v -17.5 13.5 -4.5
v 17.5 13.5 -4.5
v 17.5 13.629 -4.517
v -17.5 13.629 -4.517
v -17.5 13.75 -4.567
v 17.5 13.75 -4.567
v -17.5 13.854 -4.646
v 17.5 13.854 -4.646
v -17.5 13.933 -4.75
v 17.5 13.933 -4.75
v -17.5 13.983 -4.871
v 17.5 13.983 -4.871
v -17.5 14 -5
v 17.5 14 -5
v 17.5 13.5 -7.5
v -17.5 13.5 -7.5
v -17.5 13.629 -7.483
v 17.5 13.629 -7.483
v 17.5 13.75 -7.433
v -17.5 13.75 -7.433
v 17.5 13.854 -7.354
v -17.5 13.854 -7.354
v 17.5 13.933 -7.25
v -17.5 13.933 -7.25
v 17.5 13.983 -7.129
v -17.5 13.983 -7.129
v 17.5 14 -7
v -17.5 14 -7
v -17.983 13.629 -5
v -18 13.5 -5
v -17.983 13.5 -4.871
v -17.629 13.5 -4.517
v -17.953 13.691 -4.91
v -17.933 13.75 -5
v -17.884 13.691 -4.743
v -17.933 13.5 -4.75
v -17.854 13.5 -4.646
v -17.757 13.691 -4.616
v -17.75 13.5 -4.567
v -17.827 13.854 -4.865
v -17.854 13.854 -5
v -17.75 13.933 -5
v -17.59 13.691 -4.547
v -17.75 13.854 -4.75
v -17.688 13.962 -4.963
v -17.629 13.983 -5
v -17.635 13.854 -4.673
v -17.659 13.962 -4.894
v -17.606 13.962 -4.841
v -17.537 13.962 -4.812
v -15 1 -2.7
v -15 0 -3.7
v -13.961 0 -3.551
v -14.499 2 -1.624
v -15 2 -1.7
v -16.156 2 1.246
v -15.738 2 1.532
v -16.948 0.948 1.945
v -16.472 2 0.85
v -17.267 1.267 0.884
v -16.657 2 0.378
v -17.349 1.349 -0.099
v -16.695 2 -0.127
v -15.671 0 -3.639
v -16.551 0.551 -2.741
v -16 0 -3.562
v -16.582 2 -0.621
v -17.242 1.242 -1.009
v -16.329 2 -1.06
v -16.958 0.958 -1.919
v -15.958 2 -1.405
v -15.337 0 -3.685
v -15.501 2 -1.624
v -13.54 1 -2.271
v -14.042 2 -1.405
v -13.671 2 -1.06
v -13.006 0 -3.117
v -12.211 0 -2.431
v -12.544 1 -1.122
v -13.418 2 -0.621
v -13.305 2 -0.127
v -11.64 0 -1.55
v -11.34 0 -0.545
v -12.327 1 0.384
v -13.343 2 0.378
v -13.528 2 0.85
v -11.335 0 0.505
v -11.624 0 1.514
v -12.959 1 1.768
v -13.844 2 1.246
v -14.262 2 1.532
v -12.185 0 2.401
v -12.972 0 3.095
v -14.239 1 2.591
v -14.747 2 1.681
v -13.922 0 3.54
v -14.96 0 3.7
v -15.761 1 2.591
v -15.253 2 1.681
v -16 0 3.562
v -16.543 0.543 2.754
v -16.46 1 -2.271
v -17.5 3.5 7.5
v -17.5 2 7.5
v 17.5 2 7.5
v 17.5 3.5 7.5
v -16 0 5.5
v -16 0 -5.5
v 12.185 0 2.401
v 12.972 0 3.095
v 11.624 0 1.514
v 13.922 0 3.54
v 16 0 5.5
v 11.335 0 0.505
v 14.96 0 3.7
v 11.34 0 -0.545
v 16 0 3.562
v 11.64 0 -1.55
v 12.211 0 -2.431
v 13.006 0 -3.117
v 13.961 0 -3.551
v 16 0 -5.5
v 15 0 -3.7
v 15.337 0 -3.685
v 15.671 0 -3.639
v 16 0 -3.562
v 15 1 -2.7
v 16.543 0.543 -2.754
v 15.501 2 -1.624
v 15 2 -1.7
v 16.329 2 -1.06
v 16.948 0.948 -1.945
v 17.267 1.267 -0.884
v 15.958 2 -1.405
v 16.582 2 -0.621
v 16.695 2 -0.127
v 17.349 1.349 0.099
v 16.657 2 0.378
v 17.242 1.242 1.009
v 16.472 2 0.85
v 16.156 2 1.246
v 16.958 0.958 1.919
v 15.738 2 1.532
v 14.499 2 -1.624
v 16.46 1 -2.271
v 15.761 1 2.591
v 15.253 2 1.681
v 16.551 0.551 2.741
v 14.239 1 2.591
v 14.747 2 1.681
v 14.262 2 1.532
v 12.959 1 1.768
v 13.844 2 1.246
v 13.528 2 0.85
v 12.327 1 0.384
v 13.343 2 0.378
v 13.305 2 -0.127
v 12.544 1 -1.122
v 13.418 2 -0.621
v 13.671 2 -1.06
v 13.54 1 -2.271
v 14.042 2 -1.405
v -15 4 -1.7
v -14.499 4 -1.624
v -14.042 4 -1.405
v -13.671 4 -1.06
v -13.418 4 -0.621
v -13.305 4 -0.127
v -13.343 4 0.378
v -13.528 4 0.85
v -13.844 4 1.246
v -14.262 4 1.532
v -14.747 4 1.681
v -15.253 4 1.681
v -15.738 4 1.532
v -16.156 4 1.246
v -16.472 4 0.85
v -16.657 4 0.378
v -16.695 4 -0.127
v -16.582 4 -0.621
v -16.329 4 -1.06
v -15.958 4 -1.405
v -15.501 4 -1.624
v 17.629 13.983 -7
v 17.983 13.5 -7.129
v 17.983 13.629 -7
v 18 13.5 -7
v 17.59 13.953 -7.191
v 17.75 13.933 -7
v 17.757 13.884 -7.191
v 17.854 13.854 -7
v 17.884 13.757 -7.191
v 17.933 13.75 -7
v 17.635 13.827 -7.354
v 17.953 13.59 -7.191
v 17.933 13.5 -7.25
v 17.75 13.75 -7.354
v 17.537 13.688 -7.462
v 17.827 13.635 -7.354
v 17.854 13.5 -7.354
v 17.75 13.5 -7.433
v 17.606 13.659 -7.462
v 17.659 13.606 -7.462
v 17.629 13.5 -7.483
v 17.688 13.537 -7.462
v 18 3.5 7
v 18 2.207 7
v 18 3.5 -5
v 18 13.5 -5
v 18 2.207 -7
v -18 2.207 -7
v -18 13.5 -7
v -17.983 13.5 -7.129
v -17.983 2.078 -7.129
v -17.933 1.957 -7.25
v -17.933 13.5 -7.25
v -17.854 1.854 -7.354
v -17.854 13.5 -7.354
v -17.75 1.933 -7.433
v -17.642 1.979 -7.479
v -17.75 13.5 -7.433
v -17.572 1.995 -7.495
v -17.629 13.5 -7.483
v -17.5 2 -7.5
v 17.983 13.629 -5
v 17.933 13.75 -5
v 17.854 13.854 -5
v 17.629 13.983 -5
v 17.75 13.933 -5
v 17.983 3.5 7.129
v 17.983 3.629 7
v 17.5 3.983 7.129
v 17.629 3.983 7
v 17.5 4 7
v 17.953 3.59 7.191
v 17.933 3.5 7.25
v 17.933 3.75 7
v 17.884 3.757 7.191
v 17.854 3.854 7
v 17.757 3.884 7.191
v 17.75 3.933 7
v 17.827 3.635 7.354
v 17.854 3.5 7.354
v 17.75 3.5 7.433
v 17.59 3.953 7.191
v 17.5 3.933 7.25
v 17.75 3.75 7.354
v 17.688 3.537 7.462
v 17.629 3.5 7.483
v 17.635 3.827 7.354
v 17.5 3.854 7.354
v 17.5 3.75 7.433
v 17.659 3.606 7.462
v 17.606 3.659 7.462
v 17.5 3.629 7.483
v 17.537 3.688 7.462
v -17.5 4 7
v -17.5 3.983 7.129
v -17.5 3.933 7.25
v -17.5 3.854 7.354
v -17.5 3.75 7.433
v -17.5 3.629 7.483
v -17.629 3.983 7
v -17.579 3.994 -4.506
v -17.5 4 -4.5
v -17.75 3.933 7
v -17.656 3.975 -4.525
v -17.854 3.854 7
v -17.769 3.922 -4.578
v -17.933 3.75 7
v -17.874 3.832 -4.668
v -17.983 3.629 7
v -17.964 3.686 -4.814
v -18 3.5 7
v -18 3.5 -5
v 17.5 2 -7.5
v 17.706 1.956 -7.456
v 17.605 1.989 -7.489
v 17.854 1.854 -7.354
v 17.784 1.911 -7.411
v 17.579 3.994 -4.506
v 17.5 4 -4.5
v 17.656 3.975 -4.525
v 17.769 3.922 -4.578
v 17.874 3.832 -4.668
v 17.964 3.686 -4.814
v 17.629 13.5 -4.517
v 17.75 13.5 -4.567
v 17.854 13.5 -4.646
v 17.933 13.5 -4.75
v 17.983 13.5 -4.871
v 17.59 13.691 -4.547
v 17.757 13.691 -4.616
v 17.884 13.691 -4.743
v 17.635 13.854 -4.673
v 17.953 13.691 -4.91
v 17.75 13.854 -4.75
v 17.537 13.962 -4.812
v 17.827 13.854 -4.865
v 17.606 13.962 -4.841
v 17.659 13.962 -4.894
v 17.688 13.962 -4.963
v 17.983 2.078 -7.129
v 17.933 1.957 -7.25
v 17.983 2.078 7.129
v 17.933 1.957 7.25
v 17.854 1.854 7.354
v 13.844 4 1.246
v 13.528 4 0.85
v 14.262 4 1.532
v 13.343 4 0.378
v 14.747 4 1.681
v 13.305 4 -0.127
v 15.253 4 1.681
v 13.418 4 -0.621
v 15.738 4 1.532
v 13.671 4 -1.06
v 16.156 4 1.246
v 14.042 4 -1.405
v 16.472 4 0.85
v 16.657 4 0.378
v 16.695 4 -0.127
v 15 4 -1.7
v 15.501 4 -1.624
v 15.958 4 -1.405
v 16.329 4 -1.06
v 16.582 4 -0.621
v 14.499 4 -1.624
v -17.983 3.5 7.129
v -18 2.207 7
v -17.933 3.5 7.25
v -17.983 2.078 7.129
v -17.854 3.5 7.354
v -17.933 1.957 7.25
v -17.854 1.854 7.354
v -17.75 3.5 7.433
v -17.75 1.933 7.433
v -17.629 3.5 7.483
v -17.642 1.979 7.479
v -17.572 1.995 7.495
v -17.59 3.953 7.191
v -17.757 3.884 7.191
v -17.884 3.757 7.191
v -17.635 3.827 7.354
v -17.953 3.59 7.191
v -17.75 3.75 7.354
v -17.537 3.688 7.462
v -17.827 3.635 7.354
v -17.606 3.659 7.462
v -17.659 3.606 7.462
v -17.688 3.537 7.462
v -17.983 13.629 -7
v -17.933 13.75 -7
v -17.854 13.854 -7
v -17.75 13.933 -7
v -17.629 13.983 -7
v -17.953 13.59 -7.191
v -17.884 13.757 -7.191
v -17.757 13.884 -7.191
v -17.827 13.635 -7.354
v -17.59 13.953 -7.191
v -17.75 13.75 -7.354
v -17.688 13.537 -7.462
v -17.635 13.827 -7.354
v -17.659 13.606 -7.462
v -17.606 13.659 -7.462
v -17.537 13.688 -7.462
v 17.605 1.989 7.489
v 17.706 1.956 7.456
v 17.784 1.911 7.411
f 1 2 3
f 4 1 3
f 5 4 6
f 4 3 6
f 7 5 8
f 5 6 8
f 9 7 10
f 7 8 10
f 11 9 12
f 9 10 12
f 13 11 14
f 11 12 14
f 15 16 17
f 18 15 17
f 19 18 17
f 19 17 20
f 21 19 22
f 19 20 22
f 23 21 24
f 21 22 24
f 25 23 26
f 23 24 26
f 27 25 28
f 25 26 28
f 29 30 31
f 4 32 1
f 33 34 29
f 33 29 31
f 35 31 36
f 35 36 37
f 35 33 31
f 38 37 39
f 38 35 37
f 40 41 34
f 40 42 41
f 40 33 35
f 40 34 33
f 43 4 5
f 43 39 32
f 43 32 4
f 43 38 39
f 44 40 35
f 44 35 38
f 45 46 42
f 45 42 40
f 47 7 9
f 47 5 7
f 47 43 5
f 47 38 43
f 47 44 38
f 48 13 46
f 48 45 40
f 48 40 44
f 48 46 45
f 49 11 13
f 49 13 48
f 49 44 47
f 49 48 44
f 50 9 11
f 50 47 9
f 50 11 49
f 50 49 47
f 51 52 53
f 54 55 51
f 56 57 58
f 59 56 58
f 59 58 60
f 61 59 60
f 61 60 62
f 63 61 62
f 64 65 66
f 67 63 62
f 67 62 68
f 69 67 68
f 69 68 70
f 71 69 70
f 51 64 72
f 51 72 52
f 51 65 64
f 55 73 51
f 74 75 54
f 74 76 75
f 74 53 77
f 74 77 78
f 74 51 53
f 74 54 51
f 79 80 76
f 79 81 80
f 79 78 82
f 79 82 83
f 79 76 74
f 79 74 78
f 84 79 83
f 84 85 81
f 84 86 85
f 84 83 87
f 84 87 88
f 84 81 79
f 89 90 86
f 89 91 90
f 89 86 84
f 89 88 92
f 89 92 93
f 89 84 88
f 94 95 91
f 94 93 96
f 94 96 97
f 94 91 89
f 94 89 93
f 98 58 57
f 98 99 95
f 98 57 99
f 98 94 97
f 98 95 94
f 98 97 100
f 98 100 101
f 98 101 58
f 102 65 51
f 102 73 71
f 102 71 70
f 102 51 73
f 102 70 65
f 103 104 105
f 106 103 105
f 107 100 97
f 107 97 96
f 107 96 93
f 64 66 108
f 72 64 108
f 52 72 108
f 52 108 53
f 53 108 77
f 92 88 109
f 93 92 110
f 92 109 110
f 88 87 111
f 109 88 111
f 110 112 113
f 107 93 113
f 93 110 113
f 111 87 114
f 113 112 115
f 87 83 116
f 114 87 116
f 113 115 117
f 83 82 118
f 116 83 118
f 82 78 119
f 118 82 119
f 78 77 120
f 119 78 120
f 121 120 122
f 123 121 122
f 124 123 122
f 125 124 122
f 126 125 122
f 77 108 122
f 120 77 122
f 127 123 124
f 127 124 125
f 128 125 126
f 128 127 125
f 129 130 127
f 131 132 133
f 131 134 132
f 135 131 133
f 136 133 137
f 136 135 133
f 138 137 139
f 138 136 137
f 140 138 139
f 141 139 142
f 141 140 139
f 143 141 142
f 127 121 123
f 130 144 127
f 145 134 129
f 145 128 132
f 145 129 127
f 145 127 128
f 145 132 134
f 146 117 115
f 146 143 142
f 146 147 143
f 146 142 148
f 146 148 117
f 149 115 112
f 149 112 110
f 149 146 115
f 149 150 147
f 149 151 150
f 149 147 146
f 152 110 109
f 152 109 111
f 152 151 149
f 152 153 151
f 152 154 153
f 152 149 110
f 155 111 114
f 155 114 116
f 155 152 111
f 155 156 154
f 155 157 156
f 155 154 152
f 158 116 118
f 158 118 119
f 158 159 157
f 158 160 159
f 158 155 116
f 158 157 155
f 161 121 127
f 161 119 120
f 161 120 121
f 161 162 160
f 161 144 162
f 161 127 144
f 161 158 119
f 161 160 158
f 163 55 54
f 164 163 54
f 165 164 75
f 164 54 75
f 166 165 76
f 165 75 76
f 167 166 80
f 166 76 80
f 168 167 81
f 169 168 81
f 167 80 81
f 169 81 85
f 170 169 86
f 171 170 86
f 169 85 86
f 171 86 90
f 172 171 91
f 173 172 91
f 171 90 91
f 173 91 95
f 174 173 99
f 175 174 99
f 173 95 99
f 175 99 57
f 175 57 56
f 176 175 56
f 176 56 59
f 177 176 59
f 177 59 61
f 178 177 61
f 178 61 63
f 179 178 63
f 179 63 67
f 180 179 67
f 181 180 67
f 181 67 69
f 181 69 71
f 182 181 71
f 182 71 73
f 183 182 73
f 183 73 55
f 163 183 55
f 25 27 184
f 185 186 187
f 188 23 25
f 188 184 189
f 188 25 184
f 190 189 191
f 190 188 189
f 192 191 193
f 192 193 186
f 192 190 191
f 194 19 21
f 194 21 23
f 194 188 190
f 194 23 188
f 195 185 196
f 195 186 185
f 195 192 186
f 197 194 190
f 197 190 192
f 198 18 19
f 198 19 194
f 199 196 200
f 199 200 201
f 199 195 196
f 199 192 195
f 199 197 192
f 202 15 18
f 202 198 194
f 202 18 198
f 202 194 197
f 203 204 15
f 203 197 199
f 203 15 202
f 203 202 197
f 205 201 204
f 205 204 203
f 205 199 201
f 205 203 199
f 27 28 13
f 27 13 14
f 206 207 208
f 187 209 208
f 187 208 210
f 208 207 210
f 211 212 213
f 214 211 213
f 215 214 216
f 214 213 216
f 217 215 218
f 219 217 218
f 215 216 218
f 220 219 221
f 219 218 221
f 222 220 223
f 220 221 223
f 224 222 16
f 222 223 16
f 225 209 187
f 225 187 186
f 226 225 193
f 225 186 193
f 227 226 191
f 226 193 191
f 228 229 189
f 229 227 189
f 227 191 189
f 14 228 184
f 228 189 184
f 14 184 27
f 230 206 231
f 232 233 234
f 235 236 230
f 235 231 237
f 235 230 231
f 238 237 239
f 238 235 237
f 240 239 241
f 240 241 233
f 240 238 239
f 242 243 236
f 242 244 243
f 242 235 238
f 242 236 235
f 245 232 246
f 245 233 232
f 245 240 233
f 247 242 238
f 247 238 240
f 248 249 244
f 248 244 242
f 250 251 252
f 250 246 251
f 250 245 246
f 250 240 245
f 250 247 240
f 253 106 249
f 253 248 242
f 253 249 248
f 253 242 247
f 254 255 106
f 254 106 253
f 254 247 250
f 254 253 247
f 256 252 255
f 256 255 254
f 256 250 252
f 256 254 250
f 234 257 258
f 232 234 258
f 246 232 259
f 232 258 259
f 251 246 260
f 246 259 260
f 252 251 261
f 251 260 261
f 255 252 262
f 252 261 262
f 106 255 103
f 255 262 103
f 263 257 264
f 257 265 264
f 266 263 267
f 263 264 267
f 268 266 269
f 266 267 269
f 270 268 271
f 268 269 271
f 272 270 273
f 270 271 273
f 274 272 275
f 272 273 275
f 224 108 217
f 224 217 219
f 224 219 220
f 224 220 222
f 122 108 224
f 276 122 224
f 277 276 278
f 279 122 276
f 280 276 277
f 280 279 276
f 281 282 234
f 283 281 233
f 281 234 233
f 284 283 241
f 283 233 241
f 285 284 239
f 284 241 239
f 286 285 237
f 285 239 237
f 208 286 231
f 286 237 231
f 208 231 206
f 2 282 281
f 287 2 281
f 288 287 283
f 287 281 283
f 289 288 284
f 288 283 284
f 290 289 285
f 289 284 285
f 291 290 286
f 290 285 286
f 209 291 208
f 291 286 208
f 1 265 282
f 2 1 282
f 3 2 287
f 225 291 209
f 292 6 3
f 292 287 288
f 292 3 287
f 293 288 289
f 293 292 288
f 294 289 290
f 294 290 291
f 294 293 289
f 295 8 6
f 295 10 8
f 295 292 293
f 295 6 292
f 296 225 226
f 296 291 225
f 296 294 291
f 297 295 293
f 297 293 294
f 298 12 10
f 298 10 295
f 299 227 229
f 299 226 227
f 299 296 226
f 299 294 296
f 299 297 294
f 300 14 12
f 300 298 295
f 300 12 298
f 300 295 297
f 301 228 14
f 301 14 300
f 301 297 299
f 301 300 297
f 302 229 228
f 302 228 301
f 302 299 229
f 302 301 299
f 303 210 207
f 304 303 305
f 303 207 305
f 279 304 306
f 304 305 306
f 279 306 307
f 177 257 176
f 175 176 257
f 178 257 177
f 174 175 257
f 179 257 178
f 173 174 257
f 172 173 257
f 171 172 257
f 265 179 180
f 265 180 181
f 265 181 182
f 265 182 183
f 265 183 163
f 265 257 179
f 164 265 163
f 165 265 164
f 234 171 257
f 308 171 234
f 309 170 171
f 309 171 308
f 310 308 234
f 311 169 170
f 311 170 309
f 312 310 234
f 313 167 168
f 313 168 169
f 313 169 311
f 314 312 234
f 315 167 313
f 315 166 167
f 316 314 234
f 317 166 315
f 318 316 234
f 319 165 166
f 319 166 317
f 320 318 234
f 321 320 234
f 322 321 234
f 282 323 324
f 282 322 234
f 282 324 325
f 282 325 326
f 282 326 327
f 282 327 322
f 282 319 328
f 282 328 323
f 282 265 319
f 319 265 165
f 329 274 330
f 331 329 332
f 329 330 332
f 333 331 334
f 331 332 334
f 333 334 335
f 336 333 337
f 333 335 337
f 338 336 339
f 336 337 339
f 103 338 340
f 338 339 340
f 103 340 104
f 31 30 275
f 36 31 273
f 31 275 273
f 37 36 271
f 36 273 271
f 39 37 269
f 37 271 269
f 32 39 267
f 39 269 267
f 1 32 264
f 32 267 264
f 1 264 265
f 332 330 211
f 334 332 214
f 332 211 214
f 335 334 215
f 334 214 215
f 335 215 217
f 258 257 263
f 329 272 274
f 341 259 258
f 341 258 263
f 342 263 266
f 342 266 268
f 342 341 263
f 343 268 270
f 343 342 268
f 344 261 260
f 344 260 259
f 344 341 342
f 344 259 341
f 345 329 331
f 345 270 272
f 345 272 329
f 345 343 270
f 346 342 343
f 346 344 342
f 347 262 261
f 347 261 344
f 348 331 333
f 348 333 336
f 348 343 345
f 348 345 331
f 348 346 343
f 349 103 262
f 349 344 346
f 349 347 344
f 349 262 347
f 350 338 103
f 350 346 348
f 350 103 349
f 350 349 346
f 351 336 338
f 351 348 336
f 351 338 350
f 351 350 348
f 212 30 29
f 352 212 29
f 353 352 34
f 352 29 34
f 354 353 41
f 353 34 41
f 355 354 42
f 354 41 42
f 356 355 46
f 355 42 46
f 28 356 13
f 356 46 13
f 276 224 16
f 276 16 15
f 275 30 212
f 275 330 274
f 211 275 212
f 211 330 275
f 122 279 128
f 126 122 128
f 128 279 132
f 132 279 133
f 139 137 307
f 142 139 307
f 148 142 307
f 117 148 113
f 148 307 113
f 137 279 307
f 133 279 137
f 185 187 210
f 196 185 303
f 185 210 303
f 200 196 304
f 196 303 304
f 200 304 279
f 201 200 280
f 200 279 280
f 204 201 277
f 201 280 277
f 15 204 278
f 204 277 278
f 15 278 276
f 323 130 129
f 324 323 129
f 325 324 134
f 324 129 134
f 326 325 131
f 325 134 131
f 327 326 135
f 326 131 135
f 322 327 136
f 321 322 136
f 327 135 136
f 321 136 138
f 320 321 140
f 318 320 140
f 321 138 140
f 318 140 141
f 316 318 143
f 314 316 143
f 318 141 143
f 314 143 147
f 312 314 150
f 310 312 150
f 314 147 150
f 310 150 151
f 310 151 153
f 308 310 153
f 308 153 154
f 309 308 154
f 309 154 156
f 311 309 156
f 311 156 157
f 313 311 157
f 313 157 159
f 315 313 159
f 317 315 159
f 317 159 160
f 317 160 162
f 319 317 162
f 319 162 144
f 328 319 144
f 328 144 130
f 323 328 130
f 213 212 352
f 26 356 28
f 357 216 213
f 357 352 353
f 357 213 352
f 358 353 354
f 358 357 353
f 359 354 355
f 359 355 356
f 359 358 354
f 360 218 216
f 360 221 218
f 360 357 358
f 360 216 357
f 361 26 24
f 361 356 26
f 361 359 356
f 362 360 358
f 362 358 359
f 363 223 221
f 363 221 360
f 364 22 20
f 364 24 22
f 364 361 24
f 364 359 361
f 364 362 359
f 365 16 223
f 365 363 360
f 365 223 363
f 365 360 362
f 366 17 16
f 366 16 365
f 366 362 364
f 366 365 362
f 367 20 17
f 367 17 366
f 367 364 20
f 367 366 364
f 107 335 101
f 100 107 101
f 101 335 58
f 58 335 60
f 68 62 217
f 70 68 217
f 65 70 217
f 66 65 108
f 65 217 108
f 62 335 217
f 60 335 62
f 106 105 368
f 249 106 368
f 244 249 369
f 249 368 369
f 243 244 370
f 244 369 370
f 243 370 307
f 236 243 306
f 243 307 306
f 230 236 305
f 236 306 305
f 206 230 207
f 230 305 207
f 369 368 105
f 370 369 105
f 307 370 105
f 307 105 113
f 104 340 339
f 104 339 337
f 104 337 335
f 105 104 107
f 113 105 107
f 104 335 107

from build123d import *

# Parameters (mm, degrees)
SKETCH_1_W          = 36
SKETCH_1_H          = 15
EXTRUDE_1_DEPTH     = 4
SKETCH_2_W          = 36
SKETCH_2_H          = 3
EXTRUDE_2_DEPTH     = 10
SKETCH_3_R          = 1.7
CUT_EXTRUDE_1_DEPTH = 8
CHAMFER_1_SIZE      = 2
FILLET_1_R          = 0.5
FILLET_2_R          = 0.5


with BuildPart() as part:
    # Эскиз1 → Бобышка-Вытянуть1 (new body)
    with BuildSketch(Plane(origin=(0, 0, 0), x_dir=(1, 0, 0), z_dir=(0, 1, 0))):
        Rectangle(SKETCH_1_W, SKETCH_1_H)
    extrude(amount=EXTRUDE_1_DEPTH)

    # Эскиз2 → Бобышка-Вытянуть2 (add)
    with BuildSketch(Plane(origin=(0, 4, 0), x_dir=(1, 0, 0), z_dir=(0, 1, 0))):
        with Locations((0, 6)):
            Rectangle(SKETCH_2_W, SKETCH_2_H)
    extrude(amount=EXTRUDE_2_DEPTH)

    # Эскиз3 → Вырез-Вытянуть1 (cut)
    with BuildSketch(Plane.XZ):
        with Locations(Location((15, 0, 0), (0, 0, 270))):
            Circle(SKETCH_3_R)
        with Locations(Location((-15, 0, 0), (0, 0, 270))):
            Circle(SKETCH_3_R)
    extrude(amount=-CUT_EXTRUDE_1_DEPTH, mode=Mode.SUBTRACT)

    # Фаска1
    # the kernel refuses this chamfer: 2 mm, written as the material it takes off along each edge
    with BuildSketch(Plane(origin=(15, 0, 0), x_dir=(0, 0, -1), z_dir=(-1, 0, 0))) as chamfer_1_piece_1:
        Polygon((1.7 + CHAMFER_1_SIZE, 0), (1.7, -CHAMFER_1_SIZE), (1.7, 0), align=None)
    revolve(axis=Axis((15, 0, 0), (0, -1, 0)), mode=Mode.SUBTRACT)
    with BuildSketch(Plane(origin=(-15, 0, 0), x_dir=(0, 0, -1), z_dir=(-1, 0, 0))) as chamfer_1_piece_2:
        Polygon((1.7 + CHAMFER_1_SIZE, 0), (1.7, -CHAMFER_1_SIZE), (1.7, 0), align=None)
    revolve(axis=Axis((-15, 0, 0), (0, -1, 0)), mode=Mode.SUBTRACT)
    with BuildSketch(Plane(origin=(-23.143365976, 0, 7.5), x_dir=(0, 0.9996219169112968, 0.027495876610586494), z_dir=(1, 0, 0))) as chamfer_1_piece_3:
        Polygon((CHAMFER_1_SIZE * 0.999621916911, -CHAMFER_1_SIZE * 0.0274958766106), (-CHAMFER_1_SIZE * 0.0274958766106, -CHAMFER_1_SIZE * 0.999621916911), (0, 0), align=None)
    extrude(amount=46.286731952, mode=Mode.SUBTRACT)
    with BuildSketch(Plane(origin=(-18, 0, -12.643365976), x_dir=(-0.02749587661058563, 0.9996219169112968, 0), z_dir=(0, 0, 1)), Plane(origin=(18, 0, 12.643365976), x_dir=(0.02749587661058563, 0.9996219169112968, 0), z_dir=(0, 0, -1))) as chamfer_1_piece_4:
        Polygon((CHAMFER_1_SIZE * 0.999621916911, -CHAMFER_1_SIZE * 0.0274958766106), (-CHAMFER_1_SIZE * 0.0274958766106, -CHAMFER_1_SIZE * 0.999621916911), (0, 0), align=None)
    extrude(amount=25.286731952, mode=Mode.SUBTRACT)
    with BuildSketch(Plane(origin=(23.143365976, 0, -7.5), x_dir=(0, -0.027495876610586365, 0.9996219169112968), z_dir=(-1, 0, 0))) as chamfer_1_piece_5:
        Polygon((CHAMFER_1_SIZE * 0.999621916911, CHAMFER_1_SIZE * 0.0274958766106), (-CHAMFER_1_SIZE * 0.0274958766106, CHAMFER_1_SIZE * 0.999621916911), (0, 0), align=None)
    extrude(amount=46.286731952, mode=Mode.SUBTRACT)

    # Скругление1
    # the kernel refuses this fillet: 0.5 mm, written as the material it takes off along each edge
    with BuildSketch(Plane(origin=(-17.5, 13.5, -5), x_dir=(0, 0, 1), z_dir=(0, 1, 0))) as fillet_1_piece_1_section:
        Polygon((0, 0), (FILLET_1_R, 0), (FILLET_1_R, -FILLET_1_R), (0, -FILLET_1_R), align=None)
    fillet_1_piece_1 = extrude(amount=FILLET_1_R, mode=Mode.PRIVATE)
    fillet_1_piece_1 = fillet_1_piece_1 - Plane(origin=(-17.5, 13.5, -5), x_dir=(0.7071067811865475, 0, -0.7071067811865475), z_dir=(0, 1, 0)) * Sphere(FILLET_1_R, mode=Mode.PRIVATE)
    add(fillet_1_piece_1, mode=Mode.SUBTRACT)
    with BuildSketch(Plane(origin=(17.5, 13.5, -5), x_dir=(1, 0, 0), z_dir=(0, 1, 0))) as fillet_1_piece_2_section:
        Polygon((0, 0), (FILLET_1_R, 0), (FILLET_1_R, -FILLET_1_R), (0, -FILLET_1_R), align=None)
    fillet_1_piece_2 = extrude(amount=FILLET_1_R, mode=Mode.PRIVATE)
    fillet_1_piece_2 = fillet_1_piece_2 - Plane(origin=(17.5, 13.5, -5), x_dir=(-0.7071067811865475, 0, -0.7071067811865475), z_dir=(0, 1, 0)) * Sphere(FILLET_1_R, mode=Mode.PRIVATE)
    add(fillet_1_piece_2, mode=Mode.SUBTRACT)
    with BuildSketch(Plane(origin=(-17.5, 13.5, -7), x_dir=(0, 1, 0), z_dir=(0, 0, -1))) as fillet_1_piece_3_section:
        Polygon((0, 0), (FILLET_1_R, 0), (FILLET_1_R, -FILLET_1_R), (0, -FILLET_1_R), align=None)
    fillet_1_piece_3 = extrude(amount=FILLET_1_R, mode=Mode.PRIVATE)
    fillet_1_piece_3 = fillet_1_piece_3 - Plane(origin=(-17.5, 13.5, -7), x_dir=(0.7071067811865475, -0.7071067811865475, 0), z_dir=(0, 0, -1)) * Sphere(FILLET_1_R, mode=Mode.PRIVATE)
    add(fillet_1_piece_3, mode=Mode.SUBTRACT)
    with BuildSketch(Plane(origin=(17.5, 13.5, -7), x_dir=(0, 1, 0), z_dir=(0, 0, -1))) as fillet_1_piece_4_section:
        Polygon((0, 0), (FILLET_1_R, 0), (FILLET_1_R, FILLET_1_R), (0, FILLET_1_R), align=None)
    fillet_1_piece_4 = extrude(amount=FILLET_1_R, mode=Mode.PRIVATE)
    fillet_1_piece_4 = fillet_1_piece_4 - Plane(origin=(17.5, 13.5, -7), x_dir=(-0.7071067811865475, -0.7071067811865475, 0), z_dir=(0, 0, -1)) * Sphere(FILLET_1_R, mode=Mode.PRIVATE)
    add(fillet_1_piece_4, mode=Mode.SUBTRACT)
    with BuildSketch(Plane(origin=(-18, 4, -4.5), x_dir=(1, 0, 0), z_dir=(0, 0, 1))) as fillet_1_piece_5:
        with BuildLine():
            CenterArc((FILLET_1_R, -FILLET_1_R), FILLET_1_R, 90, 90)
            Line((0, -FILLET_1_R), (0, 0))
            Line((0, 0), (FILLET_1_R, 0))
        make_face()
    extrude(amount=13.25, mode=Mode.SUBTRACT)
    with BuildSketch(Plane(origin=(-18, 4, -4.5), x_dir=(0, 0, -1), z_dir=(0, 1, 0))) as fillet_1_piece_6:
        with BuildLine():
            CenterArc((FILLET_1_R, -FILLET_1_R), FILLET_1_R, 90, 90)
            Line((0, -FILLET_1_R), (0, 0))
            Line((0, 0), (FILLET_1_R, 0))
        make_face()
    extrude(amount=9.5, mode=Mode.SUBTRACT)
    with BuildSketch(Plane(origin=(18, 4, -4.5), x_dir=(0, 0, -1), z_dir=(0, 1, 0))) as fillet_1_piece_7:
        with BuildLine():
            CenterArc((FILLET_1_R, FILLET_1_R), FILLET_1_R, 180, 90)
            Line((0, FILLET_1_R), (0, 0))
            Line((0, 0), (FILLET_1_R, 0))
        make_face()
    extrude(amount=9.5, mode=Mode.SUBTRACT)
    with BuildSketch(Plane(origin=(-18, 14, -5), x_dir=(0, -1, 0), z_dir=(0, 0, -1)), Plane(origin=(18, 14, -7), x_dir=(0, -1, 0), z_dir=(0, 0, 1))) as fillet_1_piece_8:
        with BuildLine():
            CenterArc((FILLET_1_R, -FILLET_1_R), FILLET_1_R, 90, 90)
            Line((0, -FILLET_1_R), (0, 0))
            Line((0, 0), (FILLET_1_R, 0))
        make_face()
    extrude(amount=2, mode=Mode.SUBTRACT)
    with BuildSketch(Plane(origin=(17.5, 14, -4.5), x_dir=(0, 0, -1), z_dir=(-1, 0, 0))) as fillet_1_piece_9:
        with BuildLine():
            CenterArc((FILLET_1_R, FILLET_1_R), FILLET_1_R, 180, 90)
            Line((0, FILLET_1_R), (0, 0))
            Line((0, 0), (FILLET_1_R, 0))
        make_face()
    extrude(amount=35, mode=Mode.SUBTRACT)
    with BuildSketch(Plane(origin=(-17.5, 14, -7.5), x_dir=(0, -1, 0), z_dir=(1, 0, 0))) as fillet_1_piece_10:
        with BuildLine():
            CenterArc((FILLET_1_R, -FILLET_1_R), FILLET_1_R, 90, 90)
            Line((0, -FILLET_1_R), (0, 0))
            Line((0, 0), (FILLET_1_R, 0))
        make_face()
    extrude(amount=35, mode=Mode.SUBTRACT)
    with BuildSketch(Plane(origin=(-18, 2, -8.017766953), x_dir=(0, 1, 0), z_dir=(0, 0, 1)), Plane(origin=(18, 2, 8.017766953), x_dir=(0, 1, 0), z_dir=(0, 0, -1))) as fillet_1_piece_11:
        with BuildLine():
            CenterArc((FILLET_1_R * 0.414213562373, -FILLET_1_R), FILLET_1_R, 90, 45)
            Line((-FILLET_1_R * 0.292893218814, -FILLET_1_R * 0.292893218814), (0, 0))
            Line((0, 0), (FILLET_1_R * 0.414213562373, 0))
        make_face()
    extrude(amount=16.035533906, mode=Mode.SUBTRACT)
    with BuildSketch(Plane(origin=(18, 4, 8.75), x_dir=(0, -1, 0), z_dir=(0, 0, -1))) as fillet_1_piece_12:
        with BuildLine():
            CenterArc((FILLET_1_R, FILLET_1_R), FILLET_1_R, 180, 90)
            Line((0, FILLET_1_R), (0, 0))
            Line((0, 0), (FILLET_1_R, 0))
        make_face()
    extrude(amount=13.25, mode=Mode.SUBTRACT)
    with BuildSketch(Plane(origin=(18, 0.75, 7.5), x_dir=(-1, 0, 0), z_dir=(0, 1, 0))) as fillet_1_piece_13:
        with BuildLine():
            CenterArc((FILLET_1_R, -FILLET_1_R), FILLET_1_R, 90, 90)
            Line((0, -FILLET_1_R), (0, 0))
            Line((0, 0), (FILLET_1_R, 0))
        make_face()
    extrude(amount=4.5, mode=Mode.SUBTRACT)
    with BuildSketch(Plane(origin=(-18, 0.75, 7.5), x_dir=(1, 0, 0), z_dir=(0, 1, 0))) as fillet_1_piece_14:
        with BuildLine():
            CenterArc((FILLET_1_R, FILLET_1_R), FILLET_1_R, 180, 90)
            Line((0, FILLET_1_R), (0, 0))
            Line((0, 0), (FILLET_1_R, 0))
        make_face()
    extrude(amount=4.5, mode=Mode.SUBTRACT)
    with BuildSketch(Plane(origin=(-18, 13.5, -7.5), x_dir=(0, 0, 1), z_dir=(0, -1, 0)), Plane(origin=(18, 0.75, -7.5), x_dir=(0, 0, 1), z_dir=(0, 1, 0))) as fillet_1_piece_15:
        with BuildLine():
            CenterArc((FILLET_1_R, -FILLET_1_R), FILLET_1_R, 90, 90)
            Line((0, -FILLET_1_R), (0, 0))
            Line((0, 0), (FILLET_1_R, 0))
        make_face()
    extrude(amount=12.75, mode=Mode.SUBTRACT)
    with BuildSketch(Plane(origin=(-18, 4, -5.75), x_dir=(1, 0, 0), z_dir=(0, 0, 1))) as fillet_1_piece_16a_section:
        with BuildLine():
            CenterArc((FILLET_1_R, -FILLET_1_R), FILLET_1_R, 90, 90)
            Line((0, -FILLET_1_R), (0, 0))
            Line((0, 0), (FILLET_1_R, 0))
        make_face()
    fillet_1_piece_16a = extrude(amount=14.5, mode=Mode.PRIVATE)
    fillet_1_piece_16a = split(fillet_1_piece_16a, bisect_by=Plane(origin=(-17.886802443, 3.886802443, -4.5), z_dir=(0, 0, -1)), keep=Keep.TOP, mode=Mode.PRIVATE)
    with BuildSketch(Plane(origin=(-18, 2.75, -4.5), x_dir=(0, 0, -1), z_dir=(0, 1, 0))) as fillet_1_piece_16b_section:
        with BuildLine():
            CenterArc((FILLET_1_R, -FILLET_1_R), FILLET_1_R, 90, 90)
            Line((0, -FILLET_1_R), (0, 0))
            Line((0, 0), (FILLET_1_R, 0))
        make_face()
    fillet_1_piece_16b = extrude(amount=10.75, mode=Mode.PRIVATE)
    fillet_1_piece_16b = split(fillet_1_piece_16b, bisect_by=Plane(origin=(-17.886802443, 4, -4.613197557), z_dir=(0, -1, 0)), keep=Keep.TOP, mode=Mode.PRIVATE)
    fillet_1_piece_16 = fillet_1_piece_16a & fillet_1_piece_16b
    add(fillet_1_piece_16, mode=Mode.SUBTRACT)
    with BuildSketch(Plane(origin=(18, 2.75, -4.5), x_dir=(0, 0, -1), z_dir=(0, 1, 0))) as fillet_1_piece_17a_section:
        with BuildLine():
            CenterArc((FILLET_1_R, FILLET_1_R), FILLET_1_R, 180, 90)
            Line((0, FILLET_1_R), (0, 0))
            Line((0, 0), (FILLET_1_R, 0))
        make_face()
    fillet_1_piece_17a = extrude(amount=10.75, mode=Mode.PRIVATE)
    fillet_1_piece_17a = split(fillet_1_piece_17a, bisect_by=Plane(origin=(17.886802443, 4, -4.613197557), z_dir=(0, -1, 0)), keep=Keep.TOP, mode=Mode.PRIVATE)
    with BuildSketch(Plane(origin=(18, 4, 8.75), x_dir=(0, -1, 0), z_dir=(0, 0, -1))) as fillet_1_piece_17b_section:
        with BuildLine():
            CenterArc((FILLET_1_R, FILLET_1_R), FILLET_1_R, 180, 90)
            Line((0, FILLET_1_R), (0, 0))
            Line((0, 0), (FILLET_1_R, 0))
        make_face()
    fillet_1_piece_17b = extrude(amount=14.5, mode=Mode.PRIVATE)
    fillet_1_piece_17b = split(fillet_1_piece_17b, bisect_by=Plane(origin=(17.886802443, 3.886802443, -4.5), z_dir=(0, 0, -1)), keep=Keep.TOP, mode=Mode.PRIVATE)
    fillet_1_piece_17 = fillet_1_piece_17a & fillet_1_piece_17b
    add(fillet_1_piece_17, mode=Mode.SUBTRACT)

    # Скругление2
    # the kernel refuses this fillet: 0.5 mm, written as the material it takes off along each edge
    with BuildSketch(Plane(origin=(17.5, 3.5, 7), x_dir=(0, 1, 0), z_dir=(0, 0, 1))) as fillet_2_piece_1_section:
        Polygon((0, 0), (FILLET_2_R, 0), (FILLET_2_R, -FILLET_2_R), (0, -FILLET_2_R), align=None)
    fillet_2_piece_1 = extrude(amount=FILLET_2_R, mode=Mode.PRIVATE)
    fillet_2_piece_1 = fillet_2_piece_1 - Plane(origin=(17.5, 3.5, 7), x_dir=(-0.7071067811865475, -0.7071067811865475, 0), z_dir=(0, 0, 1)) * Sphere(FILLET_2_R, mode=Mode.PRIVATE)
    add(fillet_2_piece_1, mode=Mode.SUBTRACT)
    with BuildSketch(Plane(origin=(-17.5, 3.5, 7), x_dir=(0, 1, 0), z_dir=(0, 0, 1))) as fillet_2_piece_2_section:
        Polygon((0, 0), (FILLET_2_R, 0), (FILLET_2_R, FILLET_2_R), (0, FILLET_2_R), align=None)
    fillet_2_piece_2 = extrude(amount=FILLET_2_R, mode=Mode.PRIVATE)
    fillet_2_piece_2 = fillet_2_piece_2 - Plane(origin=(-17.5, 3.5, 7), x_dir=(0.7071067811865475, -0.7071067811865475, 0), z_dir=(0, 0, 1)) * Sphere(FILLET_2_R, mode=Mode.PRIVATE)
    add(fillet_2_piece_2, mode=Mode.SUBTRACT)
    with BuildSketch(Plane(origin=(-17.5, 4, 7.5), x_dir=(0, -1, 0), z_dir=(1, 0, 0))) as fillet_2_piece_3:
        with BuildLine():
            CenterArc((FILLET_2_R, FILLET_2_R), FILLET_2_R, 180, 90)
            Line((0, FILLET_2_R), (0, 0))
            Line((0, 0), (FILLET_2_R, 0))
        make_face()
    extrude(amount=35, mode=Mode.SUBTRACT)


solid = part.part
